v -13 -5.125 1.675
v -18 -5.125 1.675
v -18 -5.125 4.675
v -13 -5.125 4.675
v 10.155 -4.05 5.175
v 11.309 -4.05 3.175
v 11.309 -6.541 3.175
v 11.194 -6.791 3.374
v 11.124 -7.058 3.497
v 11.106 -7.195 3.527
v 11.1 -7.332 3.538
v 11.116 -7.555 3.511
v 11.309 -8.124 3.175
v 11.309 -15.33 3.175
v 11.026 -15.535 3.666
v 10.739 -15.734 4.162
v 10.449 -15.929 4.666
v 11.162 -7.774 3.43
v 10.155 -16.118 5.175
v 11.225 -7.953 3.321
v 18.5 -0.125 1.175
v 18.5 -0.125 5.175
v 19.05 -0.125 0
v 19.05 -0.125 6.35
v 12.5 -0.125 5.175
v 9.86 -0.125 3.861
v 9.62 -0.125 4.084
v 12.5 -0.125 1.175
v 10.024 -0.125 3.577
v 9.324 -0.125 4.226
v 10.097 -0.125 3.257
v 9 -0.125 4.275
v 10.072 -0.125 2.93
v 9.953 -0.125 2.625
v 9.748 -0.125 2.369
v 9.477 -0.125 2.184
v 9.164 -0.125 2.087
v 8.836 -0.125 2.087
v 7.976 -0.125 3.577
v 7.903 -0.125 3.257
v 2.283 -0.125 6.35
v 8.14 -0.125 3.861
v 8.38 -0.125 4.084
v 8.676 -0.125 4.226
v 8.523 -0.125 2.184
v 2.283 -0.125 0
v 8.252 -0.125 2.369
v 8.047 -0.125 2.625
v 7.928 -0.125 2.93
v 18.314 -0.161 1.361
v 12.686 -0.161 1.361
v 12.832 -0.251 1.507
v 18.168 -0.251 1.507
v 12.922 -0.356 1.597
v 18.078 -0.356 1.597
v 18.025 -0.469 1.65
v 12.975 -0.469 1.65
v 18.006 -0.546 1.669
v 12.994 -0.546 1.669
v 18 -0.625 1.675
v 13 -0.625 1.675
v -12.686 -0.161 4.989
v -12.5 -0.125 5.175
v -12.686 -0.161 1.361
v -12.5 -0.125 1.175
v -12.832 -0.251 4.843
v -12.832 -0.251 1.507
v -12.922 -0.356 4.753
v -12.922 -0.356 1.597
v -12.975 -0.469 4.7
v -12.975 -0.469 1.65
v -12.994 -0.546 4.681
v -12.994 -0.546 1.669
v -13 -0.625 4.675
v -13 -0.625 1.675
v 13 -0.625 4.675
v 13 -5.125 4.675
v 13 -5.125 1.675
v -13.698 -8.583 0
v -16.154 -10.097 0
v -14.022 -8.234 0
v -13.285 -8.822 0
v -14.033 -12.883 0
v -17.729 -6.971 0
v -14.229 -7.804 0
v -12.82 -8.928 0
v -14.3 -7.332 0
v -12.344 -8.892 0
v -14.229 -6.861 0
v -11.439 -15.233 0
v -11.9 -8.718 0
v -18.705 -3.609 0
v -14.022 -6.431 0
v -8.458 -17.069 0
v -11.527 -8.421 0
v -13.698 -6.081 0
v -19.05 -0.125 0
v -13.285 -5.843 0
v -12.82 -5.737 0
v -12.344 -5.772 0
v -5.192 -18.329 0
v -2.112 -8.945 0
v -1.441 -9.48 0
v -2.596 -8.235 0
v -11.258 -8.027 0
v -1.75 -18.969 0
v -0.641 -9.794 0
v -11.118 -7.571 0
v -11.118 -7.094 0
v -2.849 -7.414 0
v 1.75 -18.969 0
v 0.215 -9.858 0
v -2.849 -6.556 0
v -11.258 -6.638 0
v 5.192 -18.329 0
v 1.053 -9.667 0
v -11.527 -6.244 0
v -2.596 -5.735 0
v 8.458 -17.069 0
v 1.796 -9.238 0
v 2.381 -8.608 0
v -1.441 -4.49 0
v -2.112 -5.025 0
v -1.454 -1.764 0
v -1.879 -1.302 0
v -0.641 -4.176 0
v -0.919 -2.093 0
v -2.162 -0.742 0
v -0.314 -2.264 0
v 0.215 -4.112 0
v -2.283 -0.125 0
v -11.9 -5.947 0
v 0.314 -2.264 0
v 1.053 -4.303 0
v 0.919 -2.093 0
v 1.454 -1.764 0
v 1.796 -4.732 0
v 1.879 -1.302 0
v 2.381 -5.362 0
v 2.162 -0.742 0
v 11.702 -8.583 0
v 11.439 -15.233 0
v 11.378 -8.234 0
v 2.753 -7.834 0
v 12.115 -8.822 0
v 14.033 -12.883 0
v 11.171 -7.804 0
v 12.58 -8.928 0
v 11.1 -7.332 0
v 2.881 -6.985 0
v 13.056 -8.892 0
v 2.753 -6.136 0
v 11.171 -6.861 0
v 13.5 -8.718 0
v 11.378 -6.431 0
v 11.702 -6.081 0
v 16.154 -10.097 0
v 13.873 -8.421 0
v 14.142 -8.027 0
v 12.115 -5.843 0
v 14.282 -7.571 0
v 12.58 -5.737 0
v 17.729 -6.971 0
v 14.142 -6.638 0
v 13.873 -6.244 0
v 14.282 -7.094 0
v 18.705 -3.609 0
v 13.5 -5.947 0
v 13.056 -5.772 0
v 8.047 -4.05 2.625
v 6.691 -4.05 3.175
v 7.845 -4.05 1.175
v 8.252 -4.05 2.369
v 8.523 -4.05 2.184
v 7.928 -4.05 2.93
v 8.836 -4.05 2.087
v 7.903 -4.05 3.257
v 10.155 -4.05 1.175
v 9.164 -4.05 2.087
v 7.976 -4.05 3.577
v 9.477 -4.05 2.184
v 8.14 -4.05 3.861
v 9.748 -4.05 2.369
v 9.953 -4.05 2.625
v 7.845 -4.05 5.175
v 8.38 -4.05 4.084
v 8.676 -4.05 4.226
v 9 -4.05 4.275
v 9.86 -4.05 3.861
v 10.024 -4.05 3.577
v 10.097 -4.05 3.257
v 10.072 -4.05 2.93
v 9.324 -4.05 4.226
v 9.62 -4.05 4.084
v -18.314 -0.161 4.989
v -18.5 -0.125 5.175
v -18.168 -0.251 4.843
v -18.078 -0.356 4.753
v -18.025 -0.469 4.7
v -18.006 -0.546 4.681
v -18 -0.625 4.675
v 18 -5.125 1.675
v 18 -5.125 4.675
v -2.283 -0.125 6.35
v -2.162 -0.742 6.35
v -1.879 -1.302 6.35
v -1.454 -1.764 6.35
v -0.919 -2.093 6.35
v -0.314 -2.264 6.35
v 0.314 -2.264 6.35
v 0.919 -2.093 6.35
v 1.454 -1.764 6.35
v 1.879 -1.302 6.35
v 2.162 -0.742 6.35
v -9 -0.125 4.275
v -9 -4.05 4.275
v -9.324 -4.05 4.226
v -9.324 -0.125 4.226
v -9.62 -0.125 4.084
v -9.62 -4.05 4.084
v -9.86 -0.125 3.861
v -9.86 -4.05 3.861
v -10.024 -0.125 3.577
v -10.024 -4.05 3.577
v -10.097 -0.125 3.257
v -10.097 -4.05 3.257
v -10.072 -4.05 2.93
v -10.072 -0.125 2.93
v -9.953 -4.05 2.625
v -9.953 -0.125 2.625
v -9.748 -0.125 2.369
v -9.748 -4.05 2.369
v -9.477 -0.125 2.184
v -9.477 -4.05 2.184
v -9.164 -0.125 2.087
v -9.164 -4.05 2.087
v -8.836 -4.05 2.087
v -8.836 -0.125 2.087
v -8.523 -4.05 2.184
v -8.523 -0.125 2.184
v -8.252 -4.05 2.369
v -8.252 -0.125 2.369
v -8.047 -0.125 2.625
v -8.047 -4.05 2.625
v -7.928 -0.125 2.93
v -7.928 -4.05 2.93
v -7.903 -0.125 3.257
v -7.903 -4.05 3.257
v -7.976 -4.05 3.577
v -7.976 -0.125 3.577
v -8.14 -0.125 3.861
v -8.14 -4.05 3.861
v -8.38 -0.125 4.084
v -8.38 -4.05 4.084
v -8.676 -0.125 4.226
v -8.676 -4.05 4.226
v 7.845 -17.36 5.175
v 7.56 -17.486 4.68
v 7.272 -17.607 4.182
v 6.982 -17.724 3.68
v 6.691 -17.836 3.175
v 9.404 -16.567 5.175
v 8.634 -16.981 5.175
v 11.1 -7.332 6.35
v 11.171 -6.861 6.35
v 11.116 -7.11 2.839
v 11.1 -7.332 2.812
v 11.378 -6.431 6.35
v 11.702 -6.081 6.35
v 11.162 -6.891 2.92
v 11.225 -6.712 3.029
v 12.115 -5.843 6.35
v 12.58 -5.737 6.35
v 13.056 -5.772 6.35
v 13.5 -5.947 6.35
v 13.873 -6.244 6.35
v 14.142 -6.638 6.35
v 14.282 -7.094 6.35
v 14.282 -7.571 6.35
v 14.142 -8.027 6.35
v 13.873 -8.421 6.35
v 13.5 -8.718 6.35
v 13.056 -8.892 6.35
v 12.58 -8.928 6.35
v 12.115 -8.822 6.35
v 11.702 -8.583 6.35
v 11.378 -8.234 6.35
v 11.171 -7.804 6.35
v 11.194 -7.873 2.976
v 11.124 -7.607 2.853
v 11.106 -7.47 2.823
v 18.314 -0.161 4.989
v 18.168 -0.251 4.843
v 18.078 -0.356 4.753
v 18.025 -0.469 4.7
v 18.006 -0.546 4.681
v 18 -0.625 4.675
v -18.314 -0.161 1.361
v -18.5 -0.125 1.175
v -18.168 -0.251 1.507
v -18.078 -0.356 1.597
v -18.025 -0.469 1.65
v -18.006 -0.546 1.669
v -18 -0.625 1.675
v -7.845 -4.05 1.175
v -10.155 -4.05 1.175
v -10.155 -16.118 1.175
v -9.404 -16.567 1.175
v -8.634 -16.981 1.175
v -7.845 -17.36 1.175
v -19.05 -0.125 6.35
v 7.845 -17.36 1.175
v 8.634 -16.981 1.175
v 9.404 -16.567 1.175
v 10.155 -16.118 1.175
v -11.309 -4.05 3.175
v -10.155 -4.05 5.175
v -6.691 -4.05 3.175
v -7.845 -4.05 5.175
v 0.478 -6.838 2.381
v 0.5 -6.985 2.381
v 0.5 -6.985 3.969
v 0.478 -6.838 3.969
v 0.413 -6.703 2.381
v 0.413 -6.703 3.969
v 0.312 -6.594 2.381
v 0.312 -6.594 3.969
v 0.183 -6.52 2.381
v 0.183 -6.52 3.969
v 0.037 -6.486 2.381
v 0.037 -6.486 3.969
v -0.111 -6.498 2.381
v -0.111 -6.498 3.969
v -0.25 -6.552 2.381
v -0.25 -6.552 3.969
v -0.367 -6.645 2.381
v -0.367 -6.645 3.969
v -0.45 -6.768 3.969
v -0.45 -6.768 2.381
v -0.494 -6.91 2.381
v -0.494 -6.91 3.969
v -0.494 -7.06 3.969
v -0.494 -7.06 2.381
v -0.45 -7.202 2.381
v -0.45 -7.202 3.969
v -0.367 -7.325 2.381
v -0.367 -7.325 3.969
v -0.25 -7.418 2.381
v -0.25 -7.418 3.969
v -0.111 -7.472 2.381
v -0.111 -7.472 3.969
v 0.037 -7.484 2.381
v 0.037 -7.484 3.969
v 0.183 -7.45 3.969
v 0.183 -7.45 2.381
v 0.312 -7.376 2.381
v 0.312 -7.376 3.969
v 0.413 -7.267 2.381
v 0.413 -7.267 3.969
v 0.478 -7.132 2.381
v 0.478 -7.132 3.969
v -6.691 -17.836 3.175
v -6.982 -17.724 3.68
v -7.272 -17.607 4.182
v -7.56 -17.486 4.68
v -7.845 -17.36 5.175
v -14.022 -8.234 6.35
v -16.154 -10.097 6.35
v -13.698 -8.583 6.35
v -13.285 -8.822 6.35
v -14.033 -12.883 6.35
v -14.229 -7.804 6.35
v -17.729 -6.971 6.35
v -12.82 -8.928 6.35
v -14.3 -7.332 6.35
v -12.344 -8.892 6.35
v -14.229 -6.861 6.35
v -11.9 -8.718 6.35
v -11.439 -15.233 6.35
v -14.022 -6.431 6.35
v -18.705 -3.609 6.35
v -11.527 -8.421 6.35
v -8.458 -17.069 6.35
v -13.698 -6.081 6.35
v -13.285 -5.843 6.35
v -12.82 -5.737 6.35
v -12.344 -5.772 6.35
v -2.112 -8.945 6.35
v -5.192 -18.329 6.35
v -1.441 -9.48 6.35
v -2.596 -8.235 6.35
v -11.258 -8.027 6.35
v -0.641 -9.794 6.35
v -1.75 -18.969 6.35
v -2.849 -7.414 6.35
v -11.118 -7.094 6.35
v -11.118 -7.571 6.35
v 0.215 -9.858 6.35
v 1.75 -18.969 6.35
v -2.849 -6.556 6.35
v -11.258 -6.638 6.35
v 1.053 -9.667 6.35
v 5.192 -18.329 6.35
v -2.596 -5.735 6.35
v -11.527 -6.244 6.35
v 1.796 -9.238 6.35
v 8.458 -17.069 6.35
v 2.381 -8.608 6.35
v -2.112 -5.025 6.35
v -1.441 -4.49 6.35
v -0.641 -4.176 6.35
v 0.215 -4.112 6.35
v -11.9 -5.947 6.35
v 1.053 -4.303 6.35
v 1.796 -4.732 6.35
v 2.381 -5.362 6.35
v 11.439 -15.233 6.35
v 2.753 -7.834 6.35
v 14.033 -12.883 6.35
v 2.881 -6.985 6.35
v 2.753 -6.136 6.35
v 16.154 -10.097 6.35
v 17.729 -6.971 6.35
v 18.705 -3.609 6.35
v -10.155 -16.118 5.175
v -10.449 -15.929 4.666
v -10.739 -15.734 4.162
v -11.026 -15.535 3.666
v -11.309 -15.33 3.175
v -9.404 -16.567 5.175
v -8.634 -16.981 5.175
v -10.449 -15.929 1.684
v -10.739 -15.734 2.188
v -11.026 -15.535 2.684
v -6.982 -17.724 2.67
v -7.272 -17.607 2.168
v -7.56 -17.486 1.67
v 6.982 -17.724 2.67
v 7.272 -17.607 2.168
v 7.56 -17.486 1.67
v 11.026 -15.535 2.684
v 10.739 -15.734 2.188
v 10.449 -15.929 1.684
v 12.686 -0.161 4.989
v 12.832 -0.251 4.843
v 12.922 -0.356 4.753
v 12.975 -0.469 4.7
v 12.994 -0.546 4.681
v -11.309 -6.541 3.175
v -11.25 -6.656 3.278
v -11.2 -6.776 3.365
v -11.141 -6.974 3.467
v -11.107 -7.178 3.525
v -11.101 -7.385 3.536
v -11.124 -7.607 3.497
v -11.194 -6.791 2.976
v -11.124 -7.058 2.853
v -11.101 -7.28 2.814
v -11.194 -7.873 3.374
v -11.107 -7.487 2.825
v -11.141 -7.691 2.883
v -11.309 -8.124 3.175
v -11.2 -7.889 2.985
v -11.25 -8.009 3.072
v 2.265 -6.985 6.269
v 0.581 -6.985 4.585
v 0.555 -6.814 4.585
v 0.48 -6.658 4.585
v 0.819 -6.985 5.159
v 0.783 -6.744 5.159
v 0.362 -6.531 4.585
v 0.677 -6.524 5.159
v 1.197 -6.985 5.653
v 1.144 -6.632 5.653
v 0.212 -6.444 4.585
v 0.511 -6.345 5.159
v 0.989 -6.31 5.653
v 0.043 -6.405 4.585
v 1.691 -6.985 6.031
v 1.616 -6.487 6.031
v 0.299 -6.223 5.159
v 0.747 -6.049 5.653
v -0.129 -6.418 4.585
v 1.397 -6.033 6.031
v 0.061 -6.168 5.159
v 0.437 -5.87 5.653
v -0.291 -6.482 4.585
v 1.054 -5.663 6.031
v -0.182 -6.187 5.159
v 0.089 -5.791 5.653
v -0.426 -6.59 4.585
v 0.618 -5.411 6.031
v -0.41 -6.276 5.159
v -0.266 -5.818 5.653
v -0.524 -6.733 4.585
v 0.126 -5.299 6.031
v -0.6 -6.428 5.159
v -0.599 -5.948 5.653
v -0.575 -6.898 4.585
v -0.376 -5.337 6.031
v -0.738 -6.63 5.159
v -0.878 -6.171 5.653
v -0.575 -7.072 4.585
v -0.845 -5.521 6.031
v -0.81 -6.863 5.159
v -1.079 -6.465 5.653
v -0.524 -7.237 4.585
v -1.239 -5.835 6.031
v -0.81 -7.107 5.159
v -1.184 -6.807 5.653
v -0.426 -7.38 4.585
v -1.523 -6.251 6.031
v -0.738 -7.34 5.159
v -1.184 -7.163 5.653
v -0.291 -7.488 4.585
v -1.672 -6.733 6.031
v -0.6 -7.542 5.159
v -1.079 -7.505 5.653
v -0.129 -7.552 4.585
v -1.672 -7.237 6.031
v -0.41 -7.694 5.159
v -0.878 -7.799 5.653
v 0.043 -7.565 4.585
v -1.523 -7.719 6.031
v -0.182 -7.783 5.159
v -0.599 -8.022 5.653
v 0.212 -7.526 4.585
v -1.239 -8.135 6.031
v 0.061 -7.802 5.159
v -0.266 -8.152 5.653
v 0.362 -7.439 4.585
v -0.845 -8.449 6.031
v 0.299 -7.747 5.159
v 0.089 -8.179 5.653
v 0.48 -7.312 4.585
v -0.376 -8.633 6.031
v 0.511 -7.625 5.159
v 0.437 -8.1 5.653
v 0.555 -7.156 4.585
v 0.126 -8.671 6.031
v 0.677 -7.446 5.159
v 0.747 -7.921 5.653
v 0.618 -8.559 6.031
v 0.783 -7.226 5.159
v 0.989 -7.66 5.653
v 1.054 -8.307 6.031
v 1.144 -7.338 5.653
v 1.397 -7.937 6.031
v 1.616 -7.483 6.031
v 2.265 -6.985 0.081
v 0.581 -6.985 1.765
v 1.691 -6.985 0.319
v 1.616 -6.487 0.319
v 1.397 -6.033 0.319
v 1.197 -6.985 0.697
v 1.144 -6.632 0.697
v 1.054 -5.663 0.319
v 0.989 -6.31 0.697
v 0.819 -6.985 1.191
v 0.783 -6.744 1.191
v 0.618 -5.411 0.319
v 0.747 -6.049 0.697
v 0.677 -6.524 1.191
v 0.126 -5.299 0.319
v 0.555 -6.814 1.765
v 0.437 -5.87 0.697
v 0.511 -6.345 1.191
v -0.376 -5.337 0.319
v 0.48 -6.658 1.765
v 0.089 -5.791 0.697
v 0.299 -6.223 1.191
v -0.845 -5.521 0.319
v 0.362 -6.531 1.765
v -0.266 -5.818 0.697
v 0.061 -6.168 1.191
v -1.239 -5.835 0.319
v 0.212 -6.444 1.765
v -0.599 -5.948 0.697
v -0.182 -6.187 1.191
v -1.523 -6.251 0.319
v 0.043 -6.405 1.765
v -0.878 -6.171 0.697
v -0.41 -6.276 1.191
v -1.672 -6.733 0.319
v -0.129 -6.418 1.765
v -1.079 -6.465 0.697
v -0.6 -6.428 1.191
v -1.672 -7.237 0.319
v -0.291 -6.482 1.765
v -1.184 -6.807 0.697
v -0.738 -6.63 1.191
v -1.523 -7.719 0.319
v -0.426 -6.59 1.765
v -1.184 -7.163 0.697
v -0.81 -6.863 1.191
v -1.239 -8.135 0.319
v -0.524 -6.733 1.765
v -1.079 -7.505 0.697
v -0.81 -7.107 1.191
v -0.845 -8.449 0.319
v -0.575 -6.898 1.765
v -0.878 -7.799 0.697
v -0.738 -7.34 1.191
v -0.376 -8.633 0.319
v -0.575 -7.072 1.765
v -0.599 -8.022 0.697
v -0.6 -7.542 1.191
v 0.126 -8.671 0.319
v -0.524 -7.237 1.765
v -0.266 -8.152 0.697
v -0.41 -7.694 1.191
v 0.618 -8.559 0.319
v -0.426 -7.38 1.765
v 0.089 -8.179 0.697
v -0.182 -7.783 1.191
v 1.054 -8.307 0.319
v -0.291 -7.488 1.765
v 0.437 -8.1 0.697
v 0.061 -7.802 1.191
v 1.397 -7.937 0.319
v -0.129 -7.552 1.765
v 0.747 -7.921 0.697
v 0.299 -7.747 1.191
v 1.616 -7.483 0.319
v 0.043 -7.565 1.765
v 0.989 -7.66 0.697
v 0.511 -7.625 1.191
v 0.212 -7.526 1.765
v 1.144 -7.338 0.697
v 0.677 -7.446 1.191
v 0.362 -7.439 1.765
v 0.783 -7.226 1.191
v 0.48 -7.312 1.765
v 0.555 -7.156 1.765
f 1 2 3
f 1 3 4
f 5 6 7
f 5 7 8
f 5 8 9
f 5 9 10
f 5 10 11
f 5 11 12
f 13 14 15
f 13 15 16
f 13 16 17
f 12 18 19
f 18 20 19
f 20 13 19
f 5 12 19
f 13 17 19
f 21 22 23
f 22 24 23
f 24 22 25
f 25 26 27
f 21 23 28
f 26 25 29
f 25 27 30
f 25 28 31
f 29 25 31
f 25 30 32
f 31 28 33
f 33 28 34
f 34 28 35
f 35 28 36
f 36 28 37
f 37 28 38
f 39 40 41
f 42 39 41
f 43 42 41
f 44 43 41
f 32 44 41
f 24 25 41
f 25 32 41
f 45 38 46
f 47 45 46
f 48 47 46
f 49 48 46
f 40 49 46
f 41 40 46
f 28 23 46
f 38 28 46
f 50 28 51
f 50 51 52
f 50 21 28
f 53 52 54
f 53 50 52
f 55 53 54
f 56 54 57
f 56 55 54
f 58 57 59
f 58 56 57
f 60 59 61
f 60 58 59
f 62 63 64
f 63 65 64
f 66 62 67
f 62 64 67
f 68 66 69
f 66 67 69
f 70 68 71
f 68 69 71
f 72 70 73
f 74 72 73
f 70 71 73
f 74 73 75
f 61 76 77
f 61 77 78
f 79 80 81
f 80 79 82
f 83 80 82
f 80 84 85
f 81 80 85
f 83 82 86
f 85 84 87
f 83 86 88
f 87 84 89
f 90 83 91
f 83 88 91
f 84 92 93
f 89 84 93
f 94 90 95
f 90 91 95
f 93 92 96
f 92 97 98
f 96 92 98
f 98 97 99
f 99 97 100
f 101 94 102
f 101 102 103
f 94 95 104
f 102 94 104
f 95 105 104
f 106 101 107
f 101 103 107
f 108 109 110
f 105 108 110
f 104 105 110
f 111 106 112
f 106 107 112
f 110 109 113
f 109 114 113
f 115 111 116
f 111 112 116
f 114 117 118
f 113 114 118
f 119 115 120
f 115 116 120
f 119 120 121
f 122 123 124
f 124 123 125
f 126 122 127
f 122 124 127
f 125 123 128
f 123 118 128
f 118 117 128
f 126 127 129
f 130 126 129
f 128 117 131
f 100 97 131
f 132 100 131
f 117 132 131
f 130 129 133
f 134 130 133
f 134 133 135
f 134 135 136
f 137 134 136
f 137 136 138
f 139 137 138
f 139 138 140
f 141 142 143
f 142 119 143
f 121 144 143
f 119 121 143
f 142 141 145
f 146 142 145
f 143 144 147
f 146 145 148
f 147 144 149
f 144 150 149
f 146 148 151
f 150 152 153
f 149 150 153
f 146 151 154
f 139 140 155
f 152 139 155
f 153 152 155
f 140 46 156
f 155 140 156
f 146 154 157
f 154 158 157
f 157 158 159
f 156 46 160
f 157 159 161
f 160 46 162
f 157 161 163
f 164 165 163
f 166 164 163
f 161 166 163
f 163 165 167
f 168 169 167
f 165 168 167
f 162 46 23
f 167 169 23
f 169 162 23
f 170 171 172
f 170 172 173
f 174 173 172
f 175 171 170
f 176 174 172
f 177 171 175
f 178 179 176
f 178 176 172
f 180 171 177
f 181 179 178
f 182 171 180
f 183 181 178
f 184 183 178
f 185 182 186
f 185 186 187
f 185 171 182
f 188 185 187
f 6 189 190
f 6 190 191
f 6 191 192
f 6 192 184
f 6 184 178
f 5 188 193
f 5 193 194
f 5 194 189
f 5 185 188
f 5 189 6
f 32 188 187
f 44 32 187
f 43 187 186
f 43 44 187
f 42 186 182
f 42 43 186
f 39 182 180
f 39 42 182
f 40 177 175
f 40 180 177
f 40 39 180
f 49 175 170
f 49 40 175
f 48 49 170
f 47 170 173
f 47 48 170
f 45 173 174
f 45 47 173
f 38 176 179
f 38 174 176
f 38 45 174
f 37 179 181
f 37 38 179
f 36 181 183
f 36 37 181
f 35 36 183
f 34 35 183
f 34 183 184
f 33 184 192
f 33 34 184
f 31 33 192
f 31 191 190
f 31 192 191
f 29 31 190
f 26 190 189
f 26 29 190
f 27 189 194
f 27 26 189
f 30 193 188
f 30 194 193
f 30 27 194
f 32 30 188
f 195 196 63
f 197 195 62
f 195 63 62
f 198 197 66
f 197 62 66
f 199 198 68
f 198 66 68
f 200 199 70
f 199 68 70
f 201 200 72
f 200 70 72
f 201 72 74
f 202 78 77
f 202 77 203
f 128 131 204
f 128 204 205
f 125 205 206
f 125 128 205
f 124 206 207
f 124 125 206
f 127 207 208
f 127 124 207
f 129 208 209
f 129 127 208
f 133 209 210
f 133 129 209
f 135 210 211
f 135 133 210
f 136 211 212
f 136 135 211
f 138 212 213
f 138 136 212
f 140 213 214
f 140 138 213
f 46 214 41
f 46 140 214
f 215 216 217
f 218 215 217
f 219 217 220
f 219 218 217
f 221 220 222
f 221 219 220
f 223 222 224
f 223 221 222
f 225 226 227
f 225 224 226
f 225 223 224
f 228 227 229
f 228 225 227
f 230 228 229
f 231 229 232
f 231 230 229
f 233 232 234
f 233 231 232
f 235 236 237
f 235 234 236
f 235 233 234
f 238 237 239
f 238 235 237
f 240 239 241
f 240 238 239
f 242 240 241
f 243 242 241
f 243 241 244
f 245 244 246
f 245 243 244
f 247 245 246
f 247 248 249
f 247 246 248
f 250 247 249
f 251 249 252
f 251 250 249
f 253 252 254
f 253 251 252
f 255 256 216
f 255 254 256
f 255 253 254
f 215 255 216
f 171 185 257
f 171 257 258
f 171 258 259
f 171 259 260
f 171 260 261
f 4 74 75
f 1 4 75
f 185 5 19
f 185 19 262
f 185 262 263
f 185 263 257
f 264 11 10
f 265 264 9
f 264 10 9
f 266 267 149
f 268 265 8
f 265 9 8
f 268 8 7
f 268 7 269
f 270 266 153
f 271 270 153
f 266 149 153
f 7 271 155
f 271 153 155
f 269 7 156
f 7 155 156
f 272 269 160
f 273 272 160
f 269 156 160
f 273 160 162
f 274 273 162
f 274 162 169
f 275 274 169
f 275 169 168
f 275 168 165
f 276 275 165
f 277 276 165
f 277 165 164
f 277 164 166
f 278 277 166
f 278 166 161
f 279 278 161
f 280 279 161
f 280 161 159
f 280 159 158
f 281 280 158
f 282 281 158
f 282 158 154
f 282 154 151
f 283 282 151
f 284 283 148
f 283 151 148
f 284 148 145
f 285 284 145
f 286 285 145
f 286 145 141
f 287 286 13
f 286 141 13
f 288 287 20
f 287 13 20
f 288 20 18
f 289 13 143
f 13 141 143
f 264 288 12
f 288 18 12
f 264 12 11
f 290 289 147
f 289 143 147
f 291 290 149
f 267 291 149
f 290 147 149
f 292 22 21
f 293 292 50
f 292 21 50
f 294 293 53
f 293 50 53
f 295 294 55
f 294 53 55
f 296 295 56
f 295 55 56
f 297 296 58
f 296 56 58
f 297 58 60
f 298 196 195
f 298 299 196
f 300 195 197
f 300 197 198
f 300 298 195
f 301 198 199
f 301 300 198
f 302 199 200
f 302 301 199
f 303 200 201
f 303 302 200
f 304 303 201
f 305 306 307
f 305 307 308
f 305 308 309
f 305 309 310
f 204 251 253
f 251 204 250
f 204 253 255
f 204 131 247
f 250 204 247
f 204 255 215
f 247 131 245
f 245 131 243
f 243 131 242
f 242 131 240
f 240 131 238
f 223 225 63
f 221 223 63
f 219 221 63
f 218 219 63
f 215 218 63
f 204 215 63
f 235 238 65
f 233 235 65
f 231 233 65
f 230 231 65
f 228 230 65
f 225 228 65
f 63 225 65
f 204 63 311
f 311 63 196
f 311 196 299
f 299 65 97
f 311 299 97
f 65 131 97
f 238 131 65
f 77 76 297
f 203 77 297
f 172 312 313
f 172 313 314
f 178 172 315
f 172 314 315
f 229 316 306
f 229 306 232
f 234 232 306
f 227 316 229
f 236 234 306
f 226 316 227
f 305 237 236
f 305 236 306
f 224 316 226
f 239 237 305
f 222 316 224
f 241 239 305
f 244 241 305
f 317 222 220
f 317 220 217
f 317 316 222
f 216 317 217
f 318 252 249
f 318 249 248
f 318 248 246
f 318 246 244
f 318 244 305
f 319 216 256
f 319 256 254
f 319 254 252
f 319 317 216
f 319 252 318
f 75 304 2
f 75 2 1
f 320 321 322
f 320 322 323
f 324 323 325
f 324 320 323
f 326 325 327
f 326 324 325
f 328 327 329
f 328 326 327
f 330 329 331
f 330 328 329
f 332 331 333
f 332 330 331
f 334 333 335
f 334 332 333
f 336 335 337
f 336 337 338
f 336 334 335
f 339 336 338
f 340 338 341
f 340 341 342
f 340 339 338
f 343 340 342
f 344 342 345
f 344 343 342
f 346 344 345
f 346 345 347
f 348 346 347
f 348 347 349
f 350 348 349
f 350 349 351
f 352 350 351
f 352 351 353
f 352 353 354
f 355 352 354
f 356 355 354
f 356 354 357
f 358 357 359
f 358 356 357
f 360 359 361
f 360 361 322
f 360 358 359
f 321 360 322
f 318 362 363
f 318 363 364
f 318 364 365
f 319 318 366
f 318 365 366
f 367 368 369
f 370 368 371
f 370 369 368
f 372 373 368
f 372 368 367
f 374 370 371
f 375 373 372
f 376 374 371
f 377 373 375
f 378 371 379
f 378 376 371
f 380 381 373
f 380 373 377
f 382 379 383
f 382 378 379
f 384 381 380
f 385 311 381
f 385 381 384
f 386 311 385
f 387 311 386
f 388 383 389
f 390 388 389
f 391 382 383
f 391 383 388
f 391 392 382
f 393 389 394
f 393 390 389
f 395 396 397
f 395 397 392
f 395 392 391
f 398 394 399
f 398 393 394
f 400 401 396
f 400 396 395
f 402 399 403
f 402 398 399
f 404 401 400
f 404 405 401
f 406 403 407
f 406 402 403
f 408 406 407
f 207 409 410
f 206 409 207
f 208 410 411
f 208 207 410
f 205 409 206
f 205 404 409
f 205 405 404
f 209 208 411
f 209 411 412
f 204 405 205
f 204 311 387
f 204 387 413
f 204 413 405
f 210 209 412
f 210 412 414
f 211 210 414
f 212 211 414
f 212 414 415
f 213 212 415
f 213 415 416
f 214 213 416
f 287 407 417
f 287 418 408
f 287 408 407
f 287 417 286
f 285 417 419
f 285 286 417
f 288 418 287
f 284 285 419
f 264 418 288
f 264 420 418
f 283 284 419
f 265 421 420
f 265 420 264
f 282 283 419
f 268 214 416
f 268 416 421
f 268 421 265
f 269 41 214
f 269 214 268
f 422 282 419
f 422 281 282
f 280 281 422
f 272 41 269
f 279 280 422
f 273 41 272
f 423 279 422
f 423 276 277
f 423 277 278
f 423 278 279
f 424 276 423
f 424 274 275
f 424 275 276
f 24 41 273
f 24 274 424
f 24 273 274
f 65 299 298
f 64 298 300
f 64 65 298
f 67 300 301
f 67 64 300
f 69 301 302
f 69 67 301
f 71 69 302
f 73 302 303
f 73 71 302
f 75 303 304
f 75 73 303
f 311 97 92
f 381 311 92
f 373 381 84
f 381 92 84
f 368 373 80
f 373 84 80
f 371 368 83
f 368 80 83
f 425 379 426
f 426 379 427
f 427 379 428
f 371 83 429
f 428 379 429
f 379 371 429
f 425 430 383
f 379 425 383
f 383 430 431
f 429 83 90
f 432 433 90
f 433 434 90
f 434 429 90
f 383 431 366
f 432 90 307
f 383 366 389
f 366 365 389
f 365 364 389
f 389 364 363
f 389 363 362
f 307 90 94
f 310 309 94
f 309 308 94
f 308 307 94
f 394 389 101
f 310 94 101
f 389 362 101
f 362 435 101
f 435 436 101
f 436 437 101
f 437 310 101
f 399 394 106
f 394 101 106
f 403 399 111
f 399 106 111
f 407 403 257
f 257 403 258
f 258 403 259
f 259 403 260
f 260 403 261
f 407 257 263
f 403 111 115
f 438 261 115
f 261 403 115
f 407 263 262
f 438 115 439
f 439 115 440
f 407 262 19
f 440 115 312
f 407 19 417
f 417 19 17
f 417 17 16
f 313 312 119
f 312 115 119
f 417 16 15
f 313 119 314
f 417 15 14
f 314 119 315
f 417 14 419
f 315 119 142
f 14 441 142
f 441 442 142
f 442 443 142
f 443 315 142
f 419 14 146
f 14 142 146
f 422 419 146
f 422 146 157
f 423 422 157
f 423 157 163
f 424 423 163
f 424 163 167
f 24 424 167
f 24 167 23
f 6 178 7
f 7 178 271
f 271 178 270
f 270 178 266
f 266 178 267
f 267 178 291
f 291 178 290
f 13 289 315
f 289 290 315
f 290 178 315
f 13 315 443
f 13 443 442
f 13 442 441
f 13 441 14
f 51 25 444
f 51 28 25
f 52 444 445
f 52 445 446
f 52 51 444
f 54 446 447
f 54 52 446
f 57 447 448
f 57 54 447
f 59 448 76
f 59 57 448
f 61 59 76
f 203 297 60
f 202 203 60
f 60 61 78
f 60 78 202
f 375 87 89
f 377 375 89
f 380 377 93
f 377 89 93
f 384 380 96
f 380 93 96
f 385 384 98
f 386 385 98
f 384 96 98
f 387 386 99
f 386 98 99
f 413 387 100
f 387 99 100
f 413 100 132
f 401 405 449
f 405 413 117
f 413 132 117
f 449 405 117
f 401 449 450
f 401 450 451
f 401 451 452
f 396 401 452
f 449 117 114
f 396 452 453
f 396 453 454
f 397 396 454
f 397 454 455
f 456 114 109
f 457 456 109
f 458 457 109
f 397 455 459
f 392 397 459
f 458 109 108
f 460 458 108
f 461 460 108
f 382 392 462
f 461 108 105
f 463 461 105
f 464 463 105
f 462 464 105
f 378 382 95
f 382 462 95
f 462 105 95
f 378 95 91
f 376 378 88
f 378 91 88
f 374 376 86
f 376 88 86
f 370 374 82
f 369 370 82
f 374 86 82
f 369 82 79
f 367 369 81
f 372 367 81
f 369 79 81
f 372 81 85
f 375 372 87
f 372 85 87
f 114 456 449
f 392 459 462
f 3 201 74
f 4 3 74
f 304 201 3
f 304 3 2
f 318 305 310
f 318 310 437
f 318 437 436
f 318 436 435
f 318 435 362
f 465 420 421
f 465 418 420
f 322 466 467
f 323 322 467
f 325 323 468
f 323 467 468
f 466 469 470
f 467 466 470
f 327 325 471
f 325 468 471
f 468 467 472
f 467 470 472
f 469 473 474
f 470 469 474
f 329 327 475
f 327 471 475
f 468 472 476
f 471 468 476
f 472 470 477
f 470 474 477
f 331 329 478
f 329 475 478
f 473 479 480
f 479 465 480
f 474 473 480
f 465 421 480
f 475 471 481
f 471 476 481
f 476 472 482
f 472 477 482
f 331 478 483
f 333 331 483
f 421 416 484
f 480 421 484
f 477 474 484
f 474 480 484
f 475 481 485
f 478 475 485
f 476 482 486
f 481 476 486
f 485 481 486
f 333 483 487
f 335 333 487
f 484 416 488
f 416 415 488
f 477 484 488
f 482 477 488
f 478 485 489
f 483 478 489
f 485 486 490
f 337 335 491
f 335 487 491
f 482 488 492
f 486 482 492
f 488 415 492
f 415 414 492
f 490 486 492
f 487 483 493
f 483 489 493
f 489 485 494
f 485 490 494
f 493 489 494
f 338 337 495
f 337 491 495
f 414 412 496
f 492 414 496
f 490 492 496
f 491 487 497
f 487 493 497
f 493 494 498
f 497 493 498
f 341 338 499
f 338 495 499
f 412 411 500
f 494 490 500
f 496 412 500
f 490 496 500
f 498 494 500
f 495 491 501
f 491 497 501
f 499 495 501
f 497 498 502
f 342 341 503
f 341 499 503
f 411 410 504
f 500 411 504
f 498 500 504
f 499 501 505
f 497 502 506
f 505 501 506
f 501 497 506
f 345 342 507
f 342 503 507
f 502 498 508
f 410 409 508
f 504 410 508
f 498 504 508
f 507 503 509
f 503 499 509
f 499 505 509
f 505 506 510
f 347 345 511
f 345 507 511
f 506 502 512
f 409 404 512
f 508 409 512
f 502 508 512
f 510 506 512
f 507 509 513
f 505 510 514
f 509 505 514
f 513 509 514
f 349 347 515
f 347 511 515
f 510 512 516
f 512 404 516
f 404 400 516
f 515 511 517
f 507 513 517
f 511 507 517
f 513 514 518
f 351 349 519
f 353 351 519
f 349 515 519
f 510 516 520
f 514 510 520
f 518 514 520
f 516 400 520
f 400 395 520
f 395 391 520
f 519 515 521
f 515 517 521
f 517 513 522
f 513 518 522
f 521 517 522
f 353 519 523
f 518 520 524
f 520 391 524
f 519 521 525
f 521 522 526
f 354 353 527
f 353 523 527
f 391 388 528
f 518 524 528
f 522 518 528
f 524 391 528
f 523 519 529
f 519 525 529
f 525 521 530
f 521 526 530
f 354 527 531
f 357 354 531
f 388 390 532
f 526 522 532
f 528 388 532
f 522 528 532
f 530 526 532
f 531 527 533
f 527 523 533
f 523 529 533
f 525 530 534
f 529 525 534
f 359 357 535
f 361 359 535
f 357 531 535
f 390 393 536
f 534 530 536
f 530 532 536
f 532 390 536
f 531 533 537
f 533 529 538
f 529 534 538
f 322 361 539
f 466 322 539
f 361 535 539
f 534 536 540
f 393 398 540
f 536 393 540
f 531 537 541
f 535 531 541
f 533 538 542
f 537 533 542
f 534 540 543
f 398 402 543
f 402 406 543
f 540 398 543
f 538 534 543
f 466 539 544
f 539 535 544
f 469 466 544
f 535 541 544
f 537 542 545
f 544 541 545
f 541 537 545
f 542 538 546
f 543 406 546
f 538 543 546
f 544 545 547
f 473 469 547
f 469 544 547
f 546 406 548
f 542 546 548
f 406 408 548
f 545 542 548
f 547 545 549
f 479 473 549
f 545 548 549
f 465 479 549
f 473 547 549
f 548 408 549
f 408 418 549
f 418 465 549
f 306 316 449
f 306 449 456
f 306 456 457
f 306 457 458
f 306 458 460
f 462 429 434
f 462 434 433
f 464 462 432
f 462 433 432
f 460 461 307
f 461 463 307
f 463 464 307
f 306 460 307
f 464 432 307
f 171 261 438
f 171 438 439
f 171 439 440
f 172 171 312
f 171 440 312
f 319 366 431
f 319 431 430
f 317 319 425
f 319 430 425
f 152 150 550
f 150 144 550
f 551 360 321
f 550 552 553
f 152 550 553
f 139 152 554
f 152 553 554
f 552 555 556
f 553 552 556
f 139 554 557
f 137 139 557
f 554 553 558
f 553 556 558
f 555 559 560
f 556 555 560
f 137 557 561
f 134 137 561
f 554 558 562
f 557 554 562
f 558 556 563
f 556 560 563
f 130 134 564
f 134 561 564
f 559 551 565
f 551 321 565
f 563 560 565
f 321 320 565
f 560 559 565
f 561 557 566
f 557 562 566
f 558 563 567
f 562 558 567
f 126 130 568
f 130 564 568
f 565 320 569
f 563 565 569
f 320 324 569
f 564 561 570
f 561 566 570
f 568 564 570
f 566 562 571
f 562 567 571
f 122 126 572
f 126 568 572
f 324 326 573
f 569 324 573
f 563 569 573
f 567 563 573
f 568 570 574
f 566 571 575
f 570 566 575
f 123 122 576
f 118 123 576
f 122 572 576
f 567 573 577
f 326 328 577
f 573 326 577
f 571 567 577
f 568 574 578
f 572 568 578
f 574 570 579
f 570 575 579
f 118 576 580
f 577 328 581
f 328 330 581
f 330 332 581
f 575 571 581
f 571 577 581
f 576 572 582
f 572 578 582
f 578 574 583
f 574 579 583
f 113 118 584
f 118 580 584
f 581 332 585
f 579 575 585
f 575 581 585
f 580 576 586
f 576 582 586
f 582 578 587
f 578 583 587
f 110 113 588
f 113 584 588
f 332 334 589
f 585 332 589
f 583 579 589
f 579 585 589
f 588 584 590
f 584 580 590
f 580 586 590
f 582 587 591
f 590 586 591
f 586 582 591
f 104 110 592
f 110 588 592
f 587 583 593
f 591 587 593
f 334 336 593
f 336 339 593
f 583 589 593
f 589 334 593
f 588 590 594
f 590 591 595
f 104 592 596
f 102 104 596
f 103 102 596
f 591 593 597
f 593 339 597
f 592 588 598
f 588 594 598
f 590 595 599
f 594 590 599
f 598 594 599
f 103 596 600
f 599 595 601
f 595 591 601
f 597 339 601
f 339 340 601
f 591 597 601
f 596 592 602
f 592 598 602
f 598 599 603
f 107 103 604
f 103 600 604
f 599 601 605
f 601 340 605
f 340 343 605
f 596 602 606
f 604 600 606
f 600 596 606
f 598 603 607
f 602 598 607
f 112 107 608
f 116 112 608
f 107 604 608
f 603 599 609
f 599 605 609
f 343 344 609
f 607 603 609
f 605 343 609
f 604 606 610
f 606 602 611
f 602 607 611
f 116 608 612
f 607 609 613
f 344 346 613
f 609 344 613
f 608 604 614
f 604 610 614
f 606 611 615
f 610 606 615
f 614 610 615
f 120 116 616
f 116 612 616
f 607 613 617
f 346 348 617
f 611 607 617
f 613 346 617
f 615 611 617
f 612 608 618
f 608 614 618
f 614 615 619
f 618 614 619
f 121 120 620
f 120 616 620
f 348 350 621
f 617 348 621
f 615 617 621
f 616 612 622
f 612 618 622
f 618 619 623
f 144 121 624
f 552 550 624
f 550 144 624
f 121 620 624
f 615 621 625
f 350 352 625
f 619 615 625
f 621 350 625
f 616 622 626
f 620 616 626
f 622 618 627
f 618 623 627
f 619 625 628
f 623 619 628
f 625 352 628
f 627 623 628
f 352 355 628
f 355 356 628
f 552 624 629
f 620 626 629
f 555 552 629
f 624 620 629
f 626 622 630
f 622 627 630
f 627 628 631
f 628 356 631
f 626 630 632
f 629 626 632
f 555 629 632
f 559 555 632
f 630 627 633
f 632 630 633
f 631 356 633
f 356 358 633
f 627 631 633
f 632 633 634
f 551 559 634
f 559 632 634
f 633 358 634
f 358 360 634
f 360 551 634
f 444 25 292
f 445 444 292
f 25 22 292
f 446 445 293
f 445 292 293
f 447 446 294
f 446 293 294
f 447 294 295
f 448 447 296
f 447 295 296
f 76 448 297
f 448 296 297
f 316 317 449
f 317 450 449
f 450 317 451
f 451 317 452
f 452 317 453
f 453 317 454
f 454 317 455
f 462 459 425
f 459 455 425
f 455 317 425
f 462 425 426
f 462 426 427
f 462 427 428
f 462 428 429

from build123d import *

# Parameters (mm, degrees)
SKETCH1_R                     = 19.05
SKETCH1_R_2                   = 0.5
BOSS_EXTRUDE1_DEPTH           = 6.35
M3_CLEARANCE_HOLE1_D          = 3.2
M3_CLEARANCE_HOLE1_DEPTH      = 29.72
M3_CLEARANCE_HOLE1_TIP        = 0.96137699
SKETCH4_W                     = 38.1
SKETCH4_H                     = 0.25
CUT_EXTRUDE1_DEPTH            = 28.679008291
CBORE_FOR_M2_SHCS1_AT_2_COUNT = 2
CBORE_FOR_M2_SHCS1_AT_2_PITCH = 18
CUT_EXTRUDE2_DEPTH            = 15
FILLET1_R                     = 2.38125
SKETCH12_W                    = 55.779861043
SKETCH12_H                    = 26.707675132
CUT_EXTRUDE3_DEPTH            = 28.678726197
SKETCH13_W                    = 5
SKETCH13_H                    = 3
CUT_EXTRUDE4_DEPTH            = 5
FILLET4_R                     = 0.5


with BuildPart() as part:
    # Sketch1 → Boss-Extrude1 (new body)
    with BuildSketch(Plane.XY):
        Circle(SKETCH1_R)
        with Locations((-6.049187445, 3.4925)):
            Circle(SKETCH1_R_2, mode=Mode.SUBTRACT)
        with Locations((6.049187445, 3.4925)):
            Circle(SKETCH1_R_2, mode=Mode.SUBTRACT)
        with Locations((0, -6.985)):
            Circle(SKETCH1_R_2, mode=Mode.SUBTRACT)
        with BuildLine():
            ThreePointArc((2.286, 0), (0, 2.286), (-2.286, 0))
            ThreePointArc((-2.286, 0), (0, -2.286), (2.286, 0))
        make_face(mode=Mode.SUBTRACT)
    extrude(amount=BOSS_EXTRUDE1_DEPTH)

    # M3 Clearance Hole1
    with Locations(Plane(origin=(-15.665967818, 20.219646462, 6.35), x_dir=(1, 0, 0), z_dir=(0, 0, 1))):
        with Locations((15.665967818, -5.554949625), (2.965967818, -27.551994881), (28.365967818, -27.551994881)):
            Hole(M3_CLEARANCE_HOLE1_D / 2, depth=M3_CLEARANCE_HOLE1_DEPTH)
            with Locations((0, 0, -(M3_CLEARANCE_HOLE1_DEPTH + M3_CLEARANCE_HOLE1_TIP / 2))):  # 118° drill point
                Cone(0, M3_CLEARANCE_HOLE1_D / 2, M3_CLEARANCE_HOLE1_TIP, mode=Mode.SUBTRACT)

    # Sketch4 → Cut-Extrude1 (cut, through all)
    with BuildSketch(Plane(origin=(0, 0, 0), x_dir=(-1, 0, 0), z_dir=(0, 0, -1))):
        Rectangle(SKETCH4_W, SKETCH4_H)
    extrude(amount=-CUT_EXTRUDE1_DEPTH, mode=Mode.SUBTRACT)


with BuildPart() as cut_extrude1_piece_1:
    # of the separate pieces the step leaves, piece 1, a body of its own (cut_extrude1_pieces)
    add(part.part.solids().sort_by_distance((19.049589891, 0.125, 0))[0])


with BuildPart() as cut_extrude1_piece_2:
    # of the separate pieces the step leaves, piece 2, a body of its own (cut_extrude1_pieces)
    add(part.part.solids().sort_by_distance((-19.049589891, -0.125, 0))[0])


with BuildPart() as cbore_for_m2_shcs1_tool:
    # Sketch9 → CBORE for M2 SHCS1 (revolve)
    with BuildSketch(Plane(origin=(-9, 19.05, 3.175), x_dir=(0, 0, 1), z_dir=(1, 0, 0))):
        Polygon((0, 0), (0, 38.1), (1.1, 38.1), (1.1, 2), (2.2, 2), (2.2, 0), align=None)
    cbore_for_m2_shcs1 = revolve(axis=Axis((-9, 25.4, 3.175), (0, -1, 0)))


with BuildPart() as cut_extrude1_piece_1_1:
    add(cut_extrude1_piece_1.part)

    # CBORE for M2 SHCS1: cut by cbore_for_m2_shcs1_tool
    add(cbore_for_m2_shcs1_tool.part, mode=Mode.SUBTRACT)


with BuildPart() as cut_extrude1_piece_2_1:
    add(cut_extrude1_piece_2.part)

    # CBORE for M2 SHCS1: cut by cbore_for_m2_shcs1_tool
    add(cbore_for_m2_shcs1_tool.part, mode=Mode.SUBTRACT)


with BuildPart() as cbore_for_m2_shcs1_at_2_tool:
    # CBORE for M2 SHCS1 at 2: CBORE for M2 SHCS1 ×2
    with Locations(*[(i * CBORE_FOR_M2_SHCS1_AT_2_PITCH, 0, 0) for i in range(1, CBORE_FOR_M2_SHCS1_AT_2_COUNT)]):
        add(cbore_for_m2_shcs1)


with BuildPart() as cut_extrude1_piece_1_2:
    add(cut_extrude1_piece_1_1.part)

    # CBORE for M2 SHCS1 at 2: cut by cbore_for_m2_shcs1_at_2_tool
    add(cbore_for_m2_shcs1_at_2_tool.part, mode=Mode.SUBTRACT)

    # Sketch12 → Cut-Extrude3 (cut, through all)
    with BuildSketch(Plane.XY):
        with Locations((0.042756797, 13.353837566)):
            Rectangle(SKETCH12_W, SKETCH12_H)
    extrude(amount=CUT_EXTRUDE3_DEPTH, mode=Mode.SUBTRACT)


with BuildPart() as cut_extrude1_piece_2_2:
    add(cut_extrude1_piece_2_1.part)

    # CBORE for M2 SHCS1 at 2: cut by cbore_for_m2_shcs1_at_2_tool
    add(cbore_for_m2_shcs1_at_2_tool.part, mode=Mode.SUBTRACT)

    # Sketch11 → Cut-Extrude2 (cut)
    with BuildSketch(Plane.XZ.offset(19.05)):
        Polygon((-10.154700538, 5.175), (-11.309401077, 3.175), (-10.154700538, 1.175), (-7.845299462, 1.175), (-6.690598923, 3.175), (-7.845299462, 5.175), align=None)
        Polygon((7.845299462, 5.175), (6.690598923, 3.175), (7.845299462, 1.175), (10.154700538, 1.175), (11.309401077, 3.175), (10.154700538, 5.175), align=None)
    extrude(amount=-CUT_EXTRUDE2_DEPTH, mode=Mode.SUBTRACT)

    # Fillet1
    fillet1_edges = [cut_extrude1_piece_2_2.edges().sort_by_distance(p)[0] for p in [
        (-0.5, -6.985, 0),
        (-0.5, -6.985, 6.35),
    ]]
    fillet(fillet1_edges, radius=FILLET1_R)

    # Sketch13 → Cut-Extrude4 (cut)
    with BuildSketch(Plane(origin=(0, -0.125, 0), x_dir=(1, 0, 0), z_dir=(0, 1, 0))):
        with Locations((-15.5, -3.175)):
            Rectangle(SKETCH13_W, SKETCH13_H)
        with Locations((15.5, -3.175)):
            Rectangle(SKETCH13_W, SKETCH13_H)
    extrude(amount=-CUT_EXTRUDE4_DEPTH, mode=Mode.SUBTRACT)

    # Fillet4
    fillet4_edges = [cut_extrude1_piece_2_2.edges().sort_by_distance(p)[0] for p in [
        (18, -0.125, 3.175),
        (15.5, -0.125, 1.675),
        (13, -0.125, 3.175),
        (15.5, -0.125, 4.675),
        (-15.5, -0.125, 1.675),
        (-18, -0.125, 3.175),
        (-15.5, -0.125, 4.675),
        (-13, -0.125, 3.175),
    ]]
    fillet(fillet4_edges, radius=FILLET4_R)


solid = cut_extrude1_piece_2_2.part
